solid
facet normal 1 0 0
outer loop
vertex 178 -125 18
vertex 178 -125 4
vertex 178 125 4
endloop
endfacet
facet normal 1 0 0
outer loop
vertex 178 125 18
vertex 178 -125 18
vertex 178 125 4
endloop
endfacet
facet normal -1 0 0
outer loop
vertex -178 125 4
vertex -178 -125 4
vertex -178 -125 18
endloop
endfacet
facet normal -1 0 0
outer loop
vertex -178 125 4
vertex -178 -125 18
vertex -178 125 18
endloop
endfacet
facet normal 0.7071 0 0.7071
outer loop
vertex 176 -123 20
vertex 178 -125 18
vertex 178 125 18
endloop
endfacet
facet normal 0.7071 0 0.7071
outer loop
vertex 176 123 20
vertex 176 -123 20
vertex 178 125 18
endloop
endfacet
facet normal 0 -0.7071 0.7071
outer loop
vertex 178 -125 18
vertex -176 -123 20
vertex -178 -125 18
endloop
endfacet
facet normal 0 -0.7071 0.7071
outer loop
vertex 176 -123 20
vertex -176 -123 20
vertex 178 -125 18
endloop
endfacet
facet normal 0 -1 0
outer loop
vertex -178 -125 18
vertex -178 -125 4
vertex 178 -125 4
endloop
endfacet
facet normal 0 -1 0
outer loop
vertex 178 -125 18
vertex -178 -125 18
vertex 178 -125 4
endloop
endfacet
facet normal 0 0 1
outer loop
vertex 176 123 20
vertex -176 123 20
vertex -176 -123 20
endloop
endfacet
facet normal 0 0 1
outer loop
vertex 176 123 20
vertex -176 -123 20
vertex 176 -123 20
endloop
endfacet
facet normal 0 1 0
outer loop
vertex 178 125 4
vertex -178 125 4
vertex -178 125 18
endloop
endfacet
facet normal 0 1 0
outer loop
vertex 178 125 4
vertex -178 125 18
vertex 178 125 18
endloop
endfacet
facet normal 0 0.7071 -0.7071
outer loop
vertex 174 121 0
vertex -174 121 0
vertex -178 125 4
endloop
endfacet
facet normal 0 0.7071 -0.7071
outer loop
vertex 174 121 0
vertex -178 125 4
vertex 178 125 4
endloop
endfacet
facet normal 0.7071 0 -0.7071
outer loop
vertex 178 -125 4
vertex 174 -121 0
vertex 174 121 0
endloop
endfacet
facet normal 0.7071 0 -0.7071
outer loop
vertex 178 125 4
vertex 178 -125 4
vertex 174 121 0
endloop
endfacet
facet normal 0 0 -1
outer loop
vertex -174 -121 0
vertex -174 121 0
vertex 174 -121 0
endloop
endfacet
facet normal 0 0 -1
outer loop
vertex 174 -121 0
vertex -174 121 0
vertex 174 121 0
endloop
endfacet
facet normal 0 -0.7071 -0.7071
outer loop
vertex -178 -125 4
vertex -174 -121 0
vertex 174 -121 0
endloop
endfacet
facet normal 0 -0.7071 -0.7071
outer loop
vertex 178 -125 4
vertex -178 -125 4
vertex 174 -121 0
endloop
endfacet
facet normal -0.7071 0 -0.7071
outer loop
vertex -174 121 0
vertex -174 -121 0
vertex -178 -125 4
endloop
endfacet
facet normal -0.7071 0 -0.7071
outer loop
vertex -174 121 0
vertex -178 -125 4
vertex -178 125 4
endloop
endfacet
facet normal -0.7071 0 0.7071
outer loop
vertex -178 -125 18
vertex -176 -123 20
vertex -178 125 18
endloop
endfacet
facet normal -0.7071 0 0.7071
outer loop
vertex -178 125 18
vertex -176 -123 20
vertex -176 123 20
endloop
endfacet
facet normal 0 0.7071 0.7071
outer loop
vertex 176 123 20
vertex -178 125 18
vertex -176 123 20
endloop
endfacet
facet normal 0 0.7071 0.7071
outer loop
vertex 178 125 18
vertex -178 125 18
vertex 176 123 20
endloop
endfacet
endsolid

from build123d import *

# Parameters (mm, degrees)
SKETCH_1_W      = 356
SKETCH_1_H      = 250
EXTRUDE_1_DEPTH = 20
CHAMFER_1_SIZE  = 4
CHAMFER_2_SIZE  = 2


with BuildPart() as part:
    # 스케치1 → 보스-돌출1 (new body)
    with BuildSketch(Plane.XY):
        Rectangle(SKETCH_1_W, SKETCH_1_H)
    extrude(amount=EXTRUDE_1_DEPTH)

    # 모따기1
    chamfer_1_edges = [part.edges().sort_by_distance(p)[0] for p in [
        (0, 125, 0),
        (178, 0, 0),
        (0, -125, 0),
        (-178, 0, 0),
    ]]
    chamfer(chamfer_1_edges, length=CHAMFER_1_SIZE)

    # 모따기2
    chamfer_2_edges = [part.edges().sort_by_distance(p)[0] for p in [
        (178, 0, 20),
        (0, 125, 20),
        (-178, 0, 20),
        (0, -125, 20),
    ]]
    chamfer(chamfer_2_edges, length=CHAMFER_2_SIZE)


solid = part.part
